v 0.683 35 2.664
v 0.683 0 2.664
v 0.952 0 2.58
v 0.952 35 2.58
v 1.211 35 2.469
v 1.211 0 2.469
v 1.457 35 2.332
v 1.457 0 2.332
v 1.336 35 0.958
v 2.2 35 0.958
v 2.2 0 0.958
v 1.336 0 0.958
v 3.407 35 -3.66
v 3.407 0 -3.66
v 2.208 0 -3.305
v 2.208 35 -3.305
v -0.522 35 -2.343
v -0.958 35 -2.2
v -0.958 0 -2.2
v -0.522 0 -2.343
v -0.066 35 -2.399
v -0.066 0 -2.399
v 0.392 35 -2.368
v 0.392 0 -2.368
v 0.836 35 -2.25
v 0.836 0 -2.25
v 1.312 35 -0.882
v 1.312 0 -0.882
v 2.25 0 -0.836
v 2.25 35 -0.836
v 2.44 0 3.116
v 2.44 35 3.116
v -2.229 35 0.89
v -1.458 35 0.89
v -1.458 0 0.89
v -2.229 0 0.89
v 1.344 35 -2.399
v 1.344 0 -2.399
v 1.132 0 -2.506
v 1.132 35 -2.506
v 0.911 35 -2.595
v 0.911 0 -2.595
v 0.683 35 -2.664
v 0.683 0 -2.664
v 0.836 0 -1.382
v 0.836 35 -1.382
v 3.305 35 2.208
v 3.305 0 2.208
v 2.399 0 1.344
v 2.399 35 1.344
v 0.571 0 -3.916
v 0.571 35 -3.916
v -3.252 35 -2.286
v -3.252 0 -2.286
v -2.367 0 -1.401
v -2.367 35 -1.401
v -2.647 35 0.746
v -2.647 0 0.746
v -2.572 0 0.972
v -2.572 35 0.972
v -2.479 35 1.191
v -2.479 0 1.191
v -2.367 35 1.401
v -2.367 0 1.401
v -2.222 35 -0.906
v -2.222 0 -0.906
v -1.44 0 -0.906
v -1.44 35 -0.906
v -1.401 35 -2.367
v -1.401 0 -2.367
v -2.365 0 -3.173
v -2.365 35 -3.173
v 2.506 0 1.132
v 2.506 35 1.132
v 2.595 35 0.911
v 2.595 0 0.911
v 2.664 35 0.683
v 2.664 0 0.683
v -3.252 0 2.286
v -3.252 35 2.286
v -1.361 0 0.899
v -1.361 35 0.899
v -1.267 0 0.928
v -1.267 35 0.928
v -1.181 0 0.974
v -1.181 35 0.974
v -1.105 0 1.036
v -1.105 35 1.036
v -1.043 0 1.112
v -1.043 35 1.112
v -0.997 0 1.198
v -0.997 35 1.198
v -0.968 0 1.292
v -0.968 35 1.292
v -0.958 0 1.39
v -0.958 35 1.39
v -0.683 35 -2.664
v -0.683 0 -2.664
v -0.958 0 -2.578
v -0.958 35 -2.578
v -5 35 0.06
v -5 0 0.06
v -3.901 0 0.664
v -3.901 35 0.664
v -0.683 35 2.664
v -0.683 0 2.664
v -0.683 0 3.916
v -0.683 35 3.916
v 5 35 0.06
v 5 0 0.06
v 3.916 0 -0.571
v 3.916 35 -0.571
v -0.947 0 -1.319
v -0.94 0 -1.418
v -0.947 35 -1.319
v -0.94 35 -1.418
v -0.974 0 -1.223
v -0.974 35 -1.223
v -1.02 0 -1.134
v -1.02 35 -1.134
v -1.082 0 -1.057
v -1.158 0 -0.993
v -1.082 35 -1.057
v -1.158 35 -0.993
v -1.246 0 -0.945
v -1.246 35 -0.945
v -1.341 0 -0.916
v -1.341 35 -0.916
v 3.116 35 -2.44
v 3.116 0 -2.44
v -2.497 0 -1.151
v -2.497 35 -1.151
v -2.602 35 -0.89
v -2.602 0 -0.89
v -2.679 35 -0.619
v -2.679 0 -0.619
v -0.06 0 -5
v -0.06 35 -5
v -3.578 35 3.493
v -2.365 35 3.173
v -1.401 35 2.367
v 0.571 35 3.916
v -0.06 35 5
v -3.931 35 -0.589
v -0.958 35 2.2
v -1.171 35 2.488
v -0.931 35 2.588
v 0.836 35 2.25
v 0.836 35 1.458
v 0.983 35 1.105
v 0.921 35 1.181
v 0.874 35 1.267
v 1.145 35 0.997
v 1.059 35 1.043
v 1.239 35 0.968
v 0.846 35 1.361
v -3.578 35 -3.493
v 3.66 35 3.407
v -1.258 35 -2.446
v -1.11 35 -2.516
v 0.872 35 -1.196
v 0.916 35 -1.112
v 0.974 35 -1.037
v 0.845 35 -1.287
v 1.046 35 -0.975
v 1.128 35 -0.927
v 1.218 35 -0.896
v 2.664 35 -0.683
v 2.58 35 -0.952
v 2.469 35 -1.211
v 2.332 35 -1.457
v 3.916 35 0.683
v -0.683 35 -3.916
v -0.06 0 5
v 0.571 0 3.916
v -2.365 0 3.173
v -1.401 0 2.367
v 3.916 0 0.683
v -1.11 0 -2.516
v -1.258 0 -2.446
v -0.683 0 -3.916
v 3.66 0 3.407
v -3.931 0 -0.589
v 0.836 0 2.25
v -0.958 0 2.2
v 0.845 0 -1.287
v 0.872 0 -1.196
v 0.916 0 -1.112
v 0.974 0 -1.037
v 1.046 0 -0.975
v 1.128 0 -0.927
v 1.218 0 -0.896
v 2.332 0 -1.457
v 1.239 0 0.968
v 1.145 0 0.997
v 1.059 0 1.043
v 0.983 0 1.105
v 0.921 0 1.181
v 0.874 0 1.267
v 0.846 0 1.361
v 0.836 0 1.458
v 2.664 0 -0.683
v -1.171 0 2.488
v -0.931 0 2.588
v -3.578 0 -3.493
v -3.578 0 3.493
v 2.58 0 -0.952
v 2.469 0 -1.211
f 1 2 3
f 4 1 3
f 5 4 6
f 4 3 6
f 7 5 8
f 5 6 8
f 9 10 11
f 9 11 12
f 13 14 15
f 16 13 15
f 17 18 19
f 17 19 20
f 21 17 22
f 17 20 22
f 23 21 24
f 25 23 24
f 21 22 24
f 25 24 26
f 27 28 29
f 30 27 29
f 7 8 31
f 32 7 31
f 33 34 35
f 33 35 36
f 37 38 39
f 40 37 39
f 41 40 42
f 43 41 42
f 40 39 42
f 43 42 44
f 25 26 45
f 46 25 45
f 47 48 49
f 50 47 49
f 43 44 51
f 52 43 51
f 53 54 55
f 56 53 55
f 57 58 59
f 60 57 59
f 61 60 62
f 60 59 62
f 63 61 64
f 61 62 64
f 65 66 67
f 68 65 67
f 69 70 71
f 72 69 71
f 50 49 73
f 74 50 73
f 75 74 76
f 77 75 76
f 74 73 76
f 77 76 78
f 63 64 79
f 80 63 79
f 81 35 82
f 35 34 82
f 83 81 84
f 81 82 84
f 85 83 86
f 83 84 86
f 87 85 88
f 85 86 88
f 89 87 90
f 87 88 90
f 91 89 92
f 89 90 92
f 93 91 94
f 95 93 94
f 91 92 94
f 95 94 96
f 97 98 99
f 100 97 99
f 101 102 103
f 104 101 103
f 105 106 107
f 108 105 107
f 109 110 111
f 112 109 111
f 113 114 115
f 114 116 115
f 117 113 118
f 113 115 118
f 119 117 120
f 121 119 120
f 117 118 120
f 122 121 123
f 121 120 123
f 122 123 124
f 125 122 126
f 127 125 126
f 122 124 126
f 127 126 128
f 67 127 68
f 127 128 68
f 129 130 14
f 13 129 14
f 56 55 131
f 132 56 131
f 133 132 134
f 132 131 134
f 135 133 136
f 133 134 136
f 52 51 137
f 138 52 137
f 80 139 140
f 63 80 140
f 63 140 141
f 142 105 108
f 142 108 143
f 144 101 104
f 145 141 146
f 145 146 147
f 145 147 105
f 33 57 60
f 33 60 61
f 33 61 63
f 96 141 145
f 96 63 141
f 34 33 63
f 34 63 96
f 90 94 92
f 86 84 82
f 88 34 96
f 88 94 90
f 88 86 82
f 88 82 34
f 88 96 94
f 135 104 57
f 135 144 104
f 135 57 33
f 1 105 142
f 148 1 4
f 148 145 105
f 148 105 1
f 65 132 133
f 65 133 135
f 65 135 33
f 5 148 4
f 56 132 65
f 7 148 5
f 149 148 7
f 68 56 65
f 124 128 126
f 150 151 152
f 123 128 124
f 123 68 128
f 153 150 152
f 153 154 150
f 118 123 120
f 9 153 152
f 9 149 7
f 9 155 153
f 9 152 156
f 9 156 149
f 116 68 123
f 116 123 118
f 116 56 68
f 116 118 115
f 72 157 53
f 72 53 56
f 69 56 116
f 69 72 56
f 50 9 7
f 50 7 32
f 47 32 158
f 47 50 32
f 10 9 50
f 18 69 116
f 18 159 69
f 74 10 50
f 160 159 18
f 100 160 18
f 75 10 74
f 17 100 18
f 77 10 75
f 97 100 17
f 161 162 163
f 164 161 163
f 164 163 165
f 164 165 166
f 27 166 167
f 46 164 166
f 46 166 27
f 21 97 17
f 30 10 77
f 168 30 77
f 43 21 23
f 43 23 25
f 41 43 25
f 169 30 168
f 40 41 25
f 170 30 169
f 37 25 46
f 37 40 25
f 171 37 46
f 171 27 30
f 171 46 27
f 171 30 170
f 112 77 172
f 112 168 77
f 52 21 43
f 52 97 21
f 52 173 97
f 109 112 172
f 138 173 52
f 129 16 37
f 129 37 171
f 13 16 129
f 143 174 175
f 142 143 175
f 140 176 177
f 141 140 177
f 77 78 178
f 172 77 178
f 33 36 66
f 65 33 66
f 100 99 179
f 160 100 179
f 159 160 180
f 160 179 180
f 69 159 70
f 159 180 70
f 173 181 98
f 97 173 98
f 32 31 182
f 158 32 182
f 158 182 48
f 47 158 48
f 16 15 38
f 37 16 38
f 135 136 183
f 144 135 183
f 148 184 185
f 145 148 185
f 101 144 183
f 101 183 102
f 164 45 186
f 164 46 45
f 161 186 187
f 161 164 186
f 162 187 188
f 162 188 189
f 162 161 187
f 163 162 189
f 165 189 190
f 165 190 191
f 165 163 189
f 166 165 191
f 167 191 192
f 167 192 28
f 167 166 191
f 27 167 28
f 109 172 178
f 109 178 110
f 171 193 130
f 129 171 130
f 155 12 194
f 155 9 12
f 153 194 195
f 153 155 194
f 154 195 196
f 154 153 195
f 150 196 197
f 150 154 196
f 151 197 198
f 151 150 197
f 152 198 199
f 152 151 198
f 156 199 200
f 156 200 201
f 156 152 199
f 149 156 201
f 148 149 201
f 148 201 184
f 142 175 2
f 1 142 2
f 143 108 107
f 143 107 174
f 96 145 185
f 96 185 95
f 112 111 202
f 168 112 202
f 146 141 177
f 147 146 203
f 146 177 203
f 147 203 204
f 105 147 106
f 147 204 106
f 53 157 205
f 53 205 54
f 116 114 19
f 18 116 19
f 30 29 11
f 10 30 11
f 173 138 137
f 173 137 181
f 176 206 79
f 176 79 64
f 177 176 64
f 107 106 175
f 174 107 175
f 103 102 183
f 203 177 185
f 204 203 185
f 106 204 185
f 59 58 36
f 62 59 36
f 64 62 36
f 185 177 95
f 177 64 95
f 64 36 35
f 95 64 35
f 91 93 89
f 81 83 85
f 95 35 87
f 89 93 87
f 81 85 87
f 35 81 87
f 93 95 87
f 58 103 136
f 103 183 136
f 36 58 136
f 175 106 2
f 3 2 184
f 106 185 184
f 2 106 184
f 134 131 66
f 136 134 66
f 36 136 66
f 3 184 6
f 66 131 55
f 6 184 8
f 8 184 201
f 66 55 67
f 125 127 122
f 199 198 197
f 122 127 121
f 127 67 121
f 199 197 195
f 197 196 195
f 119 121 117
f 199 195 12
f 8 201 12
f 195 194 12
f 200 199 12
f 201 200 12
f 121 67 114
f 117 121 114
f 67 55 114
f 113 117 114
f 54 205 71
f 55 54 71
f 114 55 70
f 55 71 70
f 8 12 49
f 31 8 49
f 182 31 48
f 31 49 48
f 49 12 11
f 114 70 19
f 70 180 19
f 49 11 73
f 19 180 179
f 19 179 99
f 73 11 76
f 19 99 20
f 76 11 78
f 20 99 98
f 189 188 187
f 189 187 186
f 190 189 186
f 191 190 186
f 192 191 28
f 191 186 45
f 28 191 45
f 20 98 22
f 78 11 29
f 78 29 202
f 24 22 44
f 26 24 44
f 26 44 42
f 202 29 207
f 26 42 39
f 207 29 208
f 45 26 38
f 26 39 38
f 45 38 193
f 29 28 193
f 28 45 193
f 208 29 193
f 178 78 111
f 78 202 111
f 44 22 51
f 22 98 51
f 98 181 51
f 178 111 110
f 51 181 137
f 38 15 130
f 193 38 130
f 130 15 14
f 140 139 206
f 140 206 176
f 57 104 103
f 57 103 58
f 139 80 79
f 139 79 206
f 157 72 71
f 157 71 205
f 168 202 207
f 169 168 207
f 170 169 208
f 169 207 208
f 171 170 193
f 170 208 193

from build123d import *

# Parameters (mm, degrees)
BOSS_EXTRUDE2_DEPTH = 35
FILLET1_R           = 0.5


with BuildPart() as part:
    # Sketch1 → Boss-Extrude2 (new body)
    # profile 1 of 16: a face of its own
    with BuildSketch(Plane(origin=(0, 0, 0), x_dir=(1, 0, 0), z_dir=(0, 1, 0))):
        with BuildLine():
            Line((-0.682874368, 2.6638661), (-0.958491781, 2.577555723))
            ThreePointArc((-0.958491781, 2.577555723), (-1.18434287, 2.481900878), (-1.400772687, 2.36650288))
            ThreePointArc((-1.400772687, 2.36650288), (-1.944543648, 1.944543648), (-2.36650288, 1.400772687))
            ThreePointArc((-2.36650288, 1.400772687), (-2.55302024, 1.02205071), (-2.679372725, 0.619242926))
            ThreePointArc((-2.679372725, 0.619242926), (-2.749220106, -0.065488988), (-2.646848542, -0.746118487))
            ThreePointArc((-2.646848542, -0.746118487), (-2.527956912, -1.082558936), (-2.36650288, -1.400772687))
            ThreePointArc((-2.36650288, -1.400772687), (-1.944543648, -1.944543648), (-1.400772687, -2.36650288))
            ThreePointArc((-1.400772687, -2.36650288), (-1.052379439, -2.540668714), (-0.682874368, -2.6638661))
            ThreePointArc((-0.682874368, -2.6638661), (0, -2.75), (0.682874368, -2.6638661))
            ThreePointArc((0.682874368, -2.6638661), (1.082558936, -2.527956912), (1.456731751, -2.332473495))
            ThreePointArc((1.456731751, -2.332473495), (1.990299888, -1.897684472), (2.399189994, -1.344019111))
            ThreePointArc((2.399189994, -1.344019111), (2.55302024, -1.02205071), (2.6638661, -0.682874368))
            ThreePointArc((2.6638661, -0.682874368), (2.728381551, -0.344142576), (2.75, 0))
            ThreePointArc((2.75, 0), (2.728381551, 0.344142576), (2.6638661, 0.682874368))
            ThreePointArc((2.6638661, 0.682874368), (2.527956912, 1.082558936), (2.332473495, 1.456731751))
            ThreePointArc((2.332473495, 1.456731751), (1.897684472, 1.990299888), (1.344019111, 2.399189994))
            ThreePointArc((1.344019111, 2.399189994), (1.02205071, 2.55302024), (0.682874368, 2.6638661))
            ThreePointArc((0.682874368, 2.6638661), (0, 2.75), (-0.682874368, 2.6638661))
        make_face()
        with BuildLine():
            ThreePointArc((-0.958491781, 2.200293959), (-0.065885125, 2.399095486), (0.836287098, 2.249583048))
            ThreePointArc((0.836287098, 2.249583048), (1.697056275, 1.697056275), (2.249583048, 0.836287098))
            ThreePointArc((2.249583048, 0.836287098), (2.362096454, 0.424853319), (2.4, 0))
            ThreePointArc((2.4, 0), (2.349543094, -0.489537791), (2.200293959, -0.958491781))
            ThreePointArc((2.200293959, -0.958491781), (1.649828868, -1.743004505), (0.836287098, -2.249583048))
            ThreePointArc((0.836287098, -2.249583048), (-0.065885125, -2.399095486), (-0.958491781, -2.200293959))
            ThreePointArc((-0.958491781, -2.200293959), (-1.723234871, -1.670467473), (-2.229029582, -0.889621899))
            ThreePointArc((-2.229029582, -0.889621899), (-2.399984108, 0.008733954), (-2.222495654, 0.905821764))
            ThreePointArc((-2.222495654, 0.905821764), (-1.717144383, 1.676727518), (-0.958491781, 2.200293959))
        make_face(mode=Mode.SUBTRACT)
    # profile 2 of 16: a face of its own
    with BuildSketch(Plane(origin=(0, 0, 0), x_dir=(1, 0, 0), z_dir=(0, 1, 0))):
        with BuildLine():
            Line((-0.927656245, 0.905821764), (-0.958491781, 2.200293959))
            ThreePointArc((-0.958491781, 2.200293959), (-1.717144383, 1.676727518), (-2.222495654, 0.905821764))
            Line((-2.222495654, 0.905821764), (-0.927656245, 0.905821764))
        make_face()
    # profile 3 of 16: a face of its own
    with BuildSketch(Plane(origin=(0, 0, 0), x_dir=(1, 0, 0), z_dir=(0, 1, 0))):
        with BuildLine():
            Line((-2.229029582, -0.889621899), (-2.222495654, 0.905821764))
            ThreePointArc((-2.222495654, 0.905821764), (-2.399984108, 0.008733954), (-2.229029582, -0.889621899))
        make_face()
    # profile 4 of 16: a face of its own
    with BuildSketch(Plane(origin=(0, 0, 0), x_dir=(1, 0, 0), z_dir=(0, 1, 0))):
        with BuildLine():
            Line((-0.958491781, -0.889621899), (-2.229029582, -0.889621899))
            ThreePointArc((-2.229029582, -0.889621899), (-1.723234871, -1.670467473), (-0.958491781, -2.200293959))
            Line((-0.958491781, -2.200293959), (-0.958491781, -0.889621899))
        make_face()
    # profile 5 of 16: a face of its own
    with BuildSketch(Plane(origin=(0, 0, 0), x_dir=(1, 0, 0), z_dir=(0, 1, 0))):
        with BuildLine():
            ThreePointArc((-0.958491781, -2.200293959), (-0.065885125, -2.399095486), (0.836287098, -2.249583048))
            Line((0.836287098, -2.249583048), (-0.958491781, -2.200293959))
        make_face()
    # profile 6 of 16: a face of its own
    with BuildSketch(Plane(origin=(0, 0, 0), x_dir=(1, 0, 0), z_dir=(0, 1, 0))):
        with BuildLine():
            ThreePointArc((0.836287098, -2.249583048), (1.649828868, -1.743004505), (2.200293959, -0.958491781))
            Line((2.200293959, -0.958491781), (0.836287098, -0.958491781))
            Line((0.836287098, -0.958491781), (0.836287098, -2.249583048))
        make_face()
    # profile 7 of 16: a face of its own
    with BuildSketch(Plane(origin=(0, 0, 0), x_dir=(1, 0, 0), z_dir=(0, 1, 0))):
        with BuildLine():
            ThreePointArc((2.4, 0), (2.362096454, 0.424853319), (2.249583048, 0.836287098))
            Line((2.249583048, 0.836287098), (2.200293959, -0.958491781))
            ThreePointArc((2.200293959, -0.958491781), (2.349543094, -0.489537791), (2.4, 0))
        make_face()
    # profile 8 of 16: a face of its own
    with BuildSketch(Plane(origin=(0, 0, 0), x_dir=(1, 0, 0), z_dir=(0, 1, 0))):
        with BuildLine():
            ThreePointArc((2.249583048, 0.836287098), (1.697056275, 1.697056275), (0.836287098, 2.249583048))
            Line((0.836287098, 2.249583048), (0.836287098, 0.905821764))
            Line((0.836287098, 0.905821764), (2.249583048, 0.836287098))
        make_face()
    # profile 9 of 16: a face of its own
    with BuildSketch(Plane(origin=(0, 0, 0), x_dir=(1, 0, 0), z_dir=(0, 1, 0))):
        with BuildLine():
            ThreePointArc((-2.646848542, -0.746118487), (-2.749220106, -0.065488988), (-2.679372725, 0.619242926))
            Line((-2.679372725, 0.619242926), (-3.931143789, 0.589424572))
            Line((-3.931143789, 0.589424572), (-5, -0.059543887))
            Line((-5, -0.059543887), (-3.901275064, -0.664461024))
            Line((-3.901275064, -0.664461024), (-2.646848542, -0.746118487))
        make_face()
    # profile 10 of 16: a face of its own
    with BuildSketch(Plane(origin=(0, 0, 0), x_dir=(1, 0, 0), z_dir=(0, 1, 0))):
        with BuildLine():
            ThreePointArc((-1.400772687, -2.36650288), (-1.944543648, -1.944543648), (-2.36650288, -1.400772687))
            Line((-2.36650288, -1.400772687), (-3.251889781, -2.286159588))
            Line((-3.251889781, -2.286159588), (-3.577637792, -3.49343002))
            Line((-3.577637792, -3.49343002), (-2.365007256, -3.173042114))
            Line((-2.365007256, -3.173042114), (-1.400772687, -2.36650288))
        make_face()
    # profile 11 of 16: a face of its own
    with BuildSketch(Plane(origin=(0, 0, 0), x_dir=(1, 0, 0), z_dir=(0, 1, 0))):
        with BuildLine():
            ThreePointArc((0.682874368, -2.6638661), (0, -2.75), (-0.682874368, -2.6638661))
            Line((-0.682874368, -2.6638661), (-0.682874368, -3.915992264))
            Line((-0.682874368, -3.915992264), (-0.059543887, -5))
            Line((-0.059543887, -5), (0.571366928, -3.915992264))
            Line((0.571366928, -3.915992264), (0.682874368, -2.6638661))
        make_face()
    # profile 12 of 16: a face of its own
    with BuildSketch(Plane(origin=(0, 0, 0), x_dir=(1, 0, 0), z_dir=(0, 1, 0))):
        with BuildLine():
            Line((3.305410563, -2.208070158), (2.399189994, -1.344019111))
            ThreePointArc((2.399189994, -1.344019111), (1.990299888, -1.897684472), (1.456731751, -2.332473495))
            Line((1.456731751, -2.332473495), (2.439899933, -3.115821544))
            Line((2.439899933, -3.115821544), (3.659816345, -3.407240789))
            Line((3.659816345, -3.407240789), (3.305410563, -2.208070158))
        make_face()
    # profile 13 of 16: a face of its own
    with BuildSketch(Plane(origin=(0, 0, 0), x_dir=(1, 0, 0), z_dir=(0, 1, 0))):
        with BuildLine():
            Line((3.915992264, 0.571366928), (2.6638661, 0.682874368))
            ThreePointArc((2.6638661, 0.682874368), (2.728381551, 0.344142576), (2.75, 0))
            ThreePointArc((2.75, 0), (2.728381551, -0.344142576), (2.6638661, -0.682874368))
            Line((2.6638661, -0.682874368), (3.915992264, -0.682874368))
            Line((3.915992264, -0.682874368), (5, -0.059543887))
            Line((5, -0.059543887), (3.915992264, 0.571366928))
        make_face()
    # profile 14 of 16: a face of its own
    with BuildSketch(Plane(origin=(0, 0, 0), x_dir=(1, 0, 0), z_dir=(0, 1, 0))):
        with BuildLine():
            Line((2.208070158, 3.305410563), (1.344019111, 2.399189994))
            ThreePointArc((1.344019111, 2.399189994), (1.897684472, 1.990299888), (2.332473495, 1.456731751))
            Line((2.332473495, 1.456731751), (3.115821544, 2.439899933))
            Line((3.115821544, 2.439899933), (3.407240789, 3.659816345))
            Line((3.407240789, 3.659816345), (2.208070158, 3.305410563))
        make_face()
    # profile 15 of 16: a face of its own
    with BuildSketch(Plane(origin=(0, 0, 0), x_dir=(1, 0, 0), z_dir=(0, 1, 0))):
        with BuildLine():
            Line((-0.682874368, 3.915992264), (-0.682874368, 2.6638661))
            ThreePointArc((-0.682874368, 2.6638661), (0, 2.75), (0.682874368, 2.6638661))
            Line((0.682874368, 2.6638661), (0.571366928, 3.915992264))
            Line((0.571366928, 3.915992264), (-0.059543887, 5))
            Line((-0.059543887, 5), (-0.682874368, 3.915992264))
        make_face()
    # profile 16 of 16: a face of its own
    with BuildSketch(Plane(origin=(0, 0, 0), x_dir=(1, 0, 0), z_dir=(0, 1, 0))):
        with BuildLine():
            ThreePointArc((-2.36650288, 1.400772687), (-1.944543648, 1.944543648), (-1.400772687, 2.36650288))
            Line((-1.400772687, 2.36650288), (-2.365007256, 3.173042114))
            Line((-2.365007256, 3.173042114), (-3.577637792, 3.49343002))
            Line((-3.577637792, 3.49343002), (-3.251889781, 2.286159588))
            Line((-3.251889781, 2.286159588), (-2.36650288, 1.400772687))
        make_face()
    extrude(amount=BOSS_EXTRUDE2_DEPTH)

    # Fillet1
    fillet1_edges = [part.edges().sort_by_distance(p)[0] for p in [
        (0.836287098, 17.5, -0.905821764),
        (-0.927656245, 17.5, -0.905821764),
        (-0.958491781, 17.5, 0.889621899),
        (0.836287098, 17.5, 0.958491781),
    ]]
    fillet(fillet1_edges, radius=FILLET1_R)


solid = part.part
